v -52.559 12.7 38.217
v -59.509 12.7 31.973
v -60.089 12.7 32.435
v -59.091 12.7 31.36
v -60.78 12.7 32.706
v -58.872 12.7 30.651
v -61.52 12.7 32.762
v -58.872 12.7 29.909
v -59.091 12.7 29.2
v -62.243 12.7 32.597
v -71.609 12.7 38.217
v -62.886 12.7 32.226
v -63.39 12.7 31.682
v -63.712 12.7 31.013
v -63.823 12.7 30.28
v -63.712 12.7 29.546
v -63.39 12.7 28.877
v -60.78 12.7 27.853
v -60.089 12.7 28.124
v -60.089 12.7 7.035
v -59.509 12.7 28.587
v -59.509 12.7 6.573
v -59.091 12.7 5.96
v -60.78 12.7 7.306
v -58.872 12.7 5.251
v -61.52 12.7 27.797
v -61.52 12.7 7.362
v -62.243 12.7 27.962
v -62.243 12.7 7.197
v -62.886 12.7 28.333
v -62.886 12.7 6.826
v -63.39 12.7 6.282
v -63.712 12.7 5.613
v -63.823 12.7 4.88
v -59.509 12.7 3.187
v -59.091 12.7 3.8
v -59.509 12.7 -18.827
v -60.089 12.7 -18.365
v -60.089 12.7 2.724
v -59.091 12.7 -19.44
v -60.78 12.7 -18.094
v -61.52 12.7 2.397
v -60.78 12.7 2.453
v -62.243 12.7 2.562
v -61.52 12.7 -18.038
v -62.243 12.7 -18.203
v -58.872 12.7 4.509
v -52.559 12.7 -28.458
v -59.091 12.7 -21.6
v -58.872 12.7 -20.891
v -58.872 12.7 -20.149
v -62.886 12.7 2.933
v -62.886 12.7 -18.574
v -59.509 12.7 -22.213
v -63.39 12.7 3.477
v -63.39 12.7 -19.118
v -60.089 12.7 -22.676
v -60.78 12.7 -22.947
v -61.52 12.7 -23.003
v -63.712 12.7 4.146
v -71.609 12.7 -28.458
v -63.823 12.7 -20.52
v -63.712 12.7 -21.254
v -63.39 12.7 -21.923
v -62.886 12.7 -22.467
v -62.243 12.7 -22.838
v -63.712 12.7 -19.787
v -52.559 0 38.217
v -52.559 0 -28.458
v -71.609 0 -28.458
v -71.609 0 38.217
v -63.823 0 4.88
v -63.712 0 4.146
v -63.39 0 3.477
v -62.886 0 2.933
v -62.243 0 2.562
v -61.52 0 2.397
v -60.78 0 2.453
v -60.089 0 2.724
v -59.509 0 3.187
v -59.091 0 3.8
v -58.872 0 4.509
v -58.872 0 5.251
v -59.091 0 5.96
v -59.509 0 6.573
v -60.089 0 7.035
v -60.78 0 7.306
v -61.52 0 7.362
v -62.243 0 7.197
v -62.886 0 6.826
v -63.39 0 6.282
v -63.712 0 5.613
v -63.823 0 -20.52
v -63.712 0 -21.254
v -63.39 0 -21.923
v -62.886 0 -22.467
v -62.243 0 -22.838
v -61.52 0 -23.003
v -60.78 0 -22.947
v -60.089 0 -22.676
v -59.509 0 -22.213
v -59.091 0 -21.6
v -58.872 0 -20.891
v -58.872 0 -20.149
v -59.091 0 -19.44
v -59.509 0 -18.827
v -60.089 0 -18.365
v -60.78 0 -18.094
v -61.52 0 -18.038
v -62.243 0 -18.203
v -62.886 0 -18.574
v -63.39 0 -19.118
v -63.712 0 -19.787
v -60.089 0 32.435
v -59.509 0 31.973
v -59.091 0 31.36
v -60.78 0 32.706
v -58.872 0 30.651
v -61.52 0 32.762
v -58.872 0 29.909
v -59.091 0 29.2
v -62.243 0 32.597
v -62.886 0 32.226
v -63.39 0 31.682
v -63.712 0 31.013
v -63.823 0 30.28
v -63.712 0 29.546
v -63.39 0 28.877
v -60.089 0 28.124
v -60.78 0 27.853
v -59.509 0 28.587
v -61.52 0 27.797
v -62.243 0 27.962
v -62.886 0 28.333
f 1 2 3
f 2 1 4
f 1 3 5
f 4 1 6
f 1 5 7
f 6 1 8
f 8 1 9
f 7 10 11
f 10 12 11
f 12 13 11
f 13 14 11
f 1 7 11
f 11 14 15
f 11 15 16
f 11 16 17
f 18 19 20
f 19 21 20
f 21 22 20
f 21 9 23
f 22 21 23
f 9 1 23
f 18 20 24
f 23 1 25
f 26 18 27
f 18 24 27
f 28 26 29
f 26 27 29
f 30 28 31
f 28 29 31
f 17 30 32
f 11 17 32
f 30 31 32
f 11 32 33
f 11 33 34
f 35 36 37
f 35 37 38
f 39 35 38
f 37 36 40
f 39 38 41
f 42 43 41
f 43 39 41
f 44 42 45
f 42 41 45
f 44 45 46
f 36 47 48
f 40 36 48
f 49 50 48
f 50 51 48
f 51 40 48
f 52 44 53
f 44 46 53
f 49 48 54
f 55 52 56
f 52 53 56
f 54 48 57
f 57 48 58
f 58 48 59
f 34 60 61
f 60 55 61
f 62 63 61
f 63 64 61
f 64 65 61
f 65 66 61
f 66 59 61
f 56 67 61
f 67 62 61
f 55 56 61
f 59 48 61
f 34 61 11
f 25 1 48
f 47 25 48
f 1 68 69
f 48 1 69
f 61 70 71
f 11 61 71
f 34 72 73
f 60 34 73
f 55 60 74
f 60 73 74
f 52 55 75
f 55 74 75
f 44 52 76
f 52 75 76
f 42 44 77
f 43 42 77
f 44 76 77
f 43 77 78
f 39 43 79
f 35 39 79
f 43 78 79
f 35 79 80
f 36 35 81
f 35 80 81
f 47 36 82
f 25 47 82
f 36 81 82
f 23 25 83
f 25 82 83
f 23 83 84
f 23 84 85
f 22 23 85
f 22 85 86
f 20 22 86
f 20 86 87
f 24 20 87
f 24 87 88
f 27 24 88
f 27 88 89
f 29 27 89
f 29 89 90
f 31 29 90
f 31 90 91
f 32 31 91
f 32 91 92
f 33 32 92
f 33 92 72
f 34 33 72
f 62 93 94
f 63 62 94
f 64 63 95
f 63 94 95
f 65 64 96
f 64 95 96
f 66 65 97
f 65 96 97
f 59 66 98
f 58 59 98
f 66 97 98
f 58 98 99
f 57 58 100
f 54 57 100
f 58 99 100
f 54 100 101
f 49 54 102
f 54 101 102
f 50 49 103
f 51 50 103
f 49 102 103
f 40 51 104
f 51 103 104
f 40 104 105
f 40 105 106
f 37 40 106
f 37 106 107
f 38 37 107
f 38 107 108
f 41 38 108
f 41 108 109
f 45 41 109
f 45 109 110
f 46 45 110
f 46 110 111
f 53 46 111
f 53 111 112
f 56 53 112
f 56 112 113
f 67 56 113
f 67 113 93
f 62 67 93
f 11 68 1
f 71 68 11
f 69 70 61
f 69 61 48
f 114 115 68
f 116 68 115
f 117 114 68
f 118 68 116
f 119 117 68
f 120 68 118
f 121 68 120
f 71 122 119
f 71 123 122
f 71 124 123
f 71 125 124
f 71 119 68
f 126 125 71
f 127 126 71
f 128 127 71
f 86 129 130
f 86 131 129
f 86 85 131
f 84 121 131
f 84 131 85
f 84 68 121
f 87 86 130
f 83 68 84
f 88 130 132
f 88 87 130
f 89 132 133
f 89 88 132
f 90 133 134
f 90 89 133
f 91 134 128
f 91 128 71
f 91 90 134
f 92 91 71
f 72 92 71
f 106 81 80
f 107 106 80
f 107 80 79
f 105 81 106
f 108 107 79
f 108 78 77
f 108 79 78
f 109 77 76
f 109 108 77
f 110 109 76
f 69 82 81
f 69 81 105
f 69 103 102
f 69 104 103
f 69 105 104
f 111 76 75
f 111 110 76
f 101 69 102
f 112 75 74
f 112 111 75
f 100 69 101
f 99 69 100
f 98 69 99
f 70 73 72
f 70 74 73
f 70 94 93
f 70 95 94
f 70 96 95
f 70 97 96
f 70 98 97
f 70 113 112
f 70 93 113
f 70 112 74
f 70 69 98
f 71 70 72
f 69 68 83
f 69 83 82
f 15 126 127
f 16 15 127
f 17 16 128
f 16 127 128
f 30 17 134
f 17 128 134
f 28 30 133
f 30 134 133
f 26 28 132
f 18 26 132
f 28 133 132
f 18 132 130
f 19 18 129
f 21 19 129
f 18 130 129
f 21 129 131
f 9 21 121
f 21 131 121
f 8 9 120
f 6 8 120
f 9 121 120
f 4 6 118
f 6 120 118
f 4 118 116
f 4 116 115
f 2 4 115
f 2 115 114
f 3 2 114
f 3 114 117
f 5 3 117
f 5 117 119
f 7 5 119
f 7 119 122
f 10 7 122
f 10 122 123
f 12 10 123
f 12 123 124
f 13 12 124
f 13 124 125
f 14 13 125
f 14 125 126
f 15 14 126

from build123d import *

# Parameters (mm, degrees)
BOSS_EXTRUDE1_DEPTH    = 12.7
F_10_CLEARANCE_HOLE1_D = 4.9784


with BuildPart() as part:
    # Sketch4 → Boss-Extrude1 (new body)
    with BuildSketch(Plane(origin=(0, 0, 0), x_dir=(1, 0, 0), z_dir=(0, 1, 0))):
        Polygon((-71.608792588, 6.232898137), (-71.608792588, 28.457898137), (-52.558792588, 28.457898137), (-52.558792588, -12.817101863), (-52.558792588, -38.217101863), (-71.608792588, -38.217101863), (-71.608792588, -12.817101863), align=None)
    extrude(amount=BOSS_EXTRUDE1_DEPTH)

    # #10 Clearance Hole1 (through all)
    with Locations(Plane(origin=(0, 12.7, 0), x_dir=(1, 0, 0), z_dir=(0, 1, 0))):
        with Locations((-61.333792588, 20.520398137), (-61.333792588, -4.879601863), (-61.333792588, -30.279601863)):
            Hole(F_10_CLEARANCE_HOLE1_D / 2)


solid = part.part
